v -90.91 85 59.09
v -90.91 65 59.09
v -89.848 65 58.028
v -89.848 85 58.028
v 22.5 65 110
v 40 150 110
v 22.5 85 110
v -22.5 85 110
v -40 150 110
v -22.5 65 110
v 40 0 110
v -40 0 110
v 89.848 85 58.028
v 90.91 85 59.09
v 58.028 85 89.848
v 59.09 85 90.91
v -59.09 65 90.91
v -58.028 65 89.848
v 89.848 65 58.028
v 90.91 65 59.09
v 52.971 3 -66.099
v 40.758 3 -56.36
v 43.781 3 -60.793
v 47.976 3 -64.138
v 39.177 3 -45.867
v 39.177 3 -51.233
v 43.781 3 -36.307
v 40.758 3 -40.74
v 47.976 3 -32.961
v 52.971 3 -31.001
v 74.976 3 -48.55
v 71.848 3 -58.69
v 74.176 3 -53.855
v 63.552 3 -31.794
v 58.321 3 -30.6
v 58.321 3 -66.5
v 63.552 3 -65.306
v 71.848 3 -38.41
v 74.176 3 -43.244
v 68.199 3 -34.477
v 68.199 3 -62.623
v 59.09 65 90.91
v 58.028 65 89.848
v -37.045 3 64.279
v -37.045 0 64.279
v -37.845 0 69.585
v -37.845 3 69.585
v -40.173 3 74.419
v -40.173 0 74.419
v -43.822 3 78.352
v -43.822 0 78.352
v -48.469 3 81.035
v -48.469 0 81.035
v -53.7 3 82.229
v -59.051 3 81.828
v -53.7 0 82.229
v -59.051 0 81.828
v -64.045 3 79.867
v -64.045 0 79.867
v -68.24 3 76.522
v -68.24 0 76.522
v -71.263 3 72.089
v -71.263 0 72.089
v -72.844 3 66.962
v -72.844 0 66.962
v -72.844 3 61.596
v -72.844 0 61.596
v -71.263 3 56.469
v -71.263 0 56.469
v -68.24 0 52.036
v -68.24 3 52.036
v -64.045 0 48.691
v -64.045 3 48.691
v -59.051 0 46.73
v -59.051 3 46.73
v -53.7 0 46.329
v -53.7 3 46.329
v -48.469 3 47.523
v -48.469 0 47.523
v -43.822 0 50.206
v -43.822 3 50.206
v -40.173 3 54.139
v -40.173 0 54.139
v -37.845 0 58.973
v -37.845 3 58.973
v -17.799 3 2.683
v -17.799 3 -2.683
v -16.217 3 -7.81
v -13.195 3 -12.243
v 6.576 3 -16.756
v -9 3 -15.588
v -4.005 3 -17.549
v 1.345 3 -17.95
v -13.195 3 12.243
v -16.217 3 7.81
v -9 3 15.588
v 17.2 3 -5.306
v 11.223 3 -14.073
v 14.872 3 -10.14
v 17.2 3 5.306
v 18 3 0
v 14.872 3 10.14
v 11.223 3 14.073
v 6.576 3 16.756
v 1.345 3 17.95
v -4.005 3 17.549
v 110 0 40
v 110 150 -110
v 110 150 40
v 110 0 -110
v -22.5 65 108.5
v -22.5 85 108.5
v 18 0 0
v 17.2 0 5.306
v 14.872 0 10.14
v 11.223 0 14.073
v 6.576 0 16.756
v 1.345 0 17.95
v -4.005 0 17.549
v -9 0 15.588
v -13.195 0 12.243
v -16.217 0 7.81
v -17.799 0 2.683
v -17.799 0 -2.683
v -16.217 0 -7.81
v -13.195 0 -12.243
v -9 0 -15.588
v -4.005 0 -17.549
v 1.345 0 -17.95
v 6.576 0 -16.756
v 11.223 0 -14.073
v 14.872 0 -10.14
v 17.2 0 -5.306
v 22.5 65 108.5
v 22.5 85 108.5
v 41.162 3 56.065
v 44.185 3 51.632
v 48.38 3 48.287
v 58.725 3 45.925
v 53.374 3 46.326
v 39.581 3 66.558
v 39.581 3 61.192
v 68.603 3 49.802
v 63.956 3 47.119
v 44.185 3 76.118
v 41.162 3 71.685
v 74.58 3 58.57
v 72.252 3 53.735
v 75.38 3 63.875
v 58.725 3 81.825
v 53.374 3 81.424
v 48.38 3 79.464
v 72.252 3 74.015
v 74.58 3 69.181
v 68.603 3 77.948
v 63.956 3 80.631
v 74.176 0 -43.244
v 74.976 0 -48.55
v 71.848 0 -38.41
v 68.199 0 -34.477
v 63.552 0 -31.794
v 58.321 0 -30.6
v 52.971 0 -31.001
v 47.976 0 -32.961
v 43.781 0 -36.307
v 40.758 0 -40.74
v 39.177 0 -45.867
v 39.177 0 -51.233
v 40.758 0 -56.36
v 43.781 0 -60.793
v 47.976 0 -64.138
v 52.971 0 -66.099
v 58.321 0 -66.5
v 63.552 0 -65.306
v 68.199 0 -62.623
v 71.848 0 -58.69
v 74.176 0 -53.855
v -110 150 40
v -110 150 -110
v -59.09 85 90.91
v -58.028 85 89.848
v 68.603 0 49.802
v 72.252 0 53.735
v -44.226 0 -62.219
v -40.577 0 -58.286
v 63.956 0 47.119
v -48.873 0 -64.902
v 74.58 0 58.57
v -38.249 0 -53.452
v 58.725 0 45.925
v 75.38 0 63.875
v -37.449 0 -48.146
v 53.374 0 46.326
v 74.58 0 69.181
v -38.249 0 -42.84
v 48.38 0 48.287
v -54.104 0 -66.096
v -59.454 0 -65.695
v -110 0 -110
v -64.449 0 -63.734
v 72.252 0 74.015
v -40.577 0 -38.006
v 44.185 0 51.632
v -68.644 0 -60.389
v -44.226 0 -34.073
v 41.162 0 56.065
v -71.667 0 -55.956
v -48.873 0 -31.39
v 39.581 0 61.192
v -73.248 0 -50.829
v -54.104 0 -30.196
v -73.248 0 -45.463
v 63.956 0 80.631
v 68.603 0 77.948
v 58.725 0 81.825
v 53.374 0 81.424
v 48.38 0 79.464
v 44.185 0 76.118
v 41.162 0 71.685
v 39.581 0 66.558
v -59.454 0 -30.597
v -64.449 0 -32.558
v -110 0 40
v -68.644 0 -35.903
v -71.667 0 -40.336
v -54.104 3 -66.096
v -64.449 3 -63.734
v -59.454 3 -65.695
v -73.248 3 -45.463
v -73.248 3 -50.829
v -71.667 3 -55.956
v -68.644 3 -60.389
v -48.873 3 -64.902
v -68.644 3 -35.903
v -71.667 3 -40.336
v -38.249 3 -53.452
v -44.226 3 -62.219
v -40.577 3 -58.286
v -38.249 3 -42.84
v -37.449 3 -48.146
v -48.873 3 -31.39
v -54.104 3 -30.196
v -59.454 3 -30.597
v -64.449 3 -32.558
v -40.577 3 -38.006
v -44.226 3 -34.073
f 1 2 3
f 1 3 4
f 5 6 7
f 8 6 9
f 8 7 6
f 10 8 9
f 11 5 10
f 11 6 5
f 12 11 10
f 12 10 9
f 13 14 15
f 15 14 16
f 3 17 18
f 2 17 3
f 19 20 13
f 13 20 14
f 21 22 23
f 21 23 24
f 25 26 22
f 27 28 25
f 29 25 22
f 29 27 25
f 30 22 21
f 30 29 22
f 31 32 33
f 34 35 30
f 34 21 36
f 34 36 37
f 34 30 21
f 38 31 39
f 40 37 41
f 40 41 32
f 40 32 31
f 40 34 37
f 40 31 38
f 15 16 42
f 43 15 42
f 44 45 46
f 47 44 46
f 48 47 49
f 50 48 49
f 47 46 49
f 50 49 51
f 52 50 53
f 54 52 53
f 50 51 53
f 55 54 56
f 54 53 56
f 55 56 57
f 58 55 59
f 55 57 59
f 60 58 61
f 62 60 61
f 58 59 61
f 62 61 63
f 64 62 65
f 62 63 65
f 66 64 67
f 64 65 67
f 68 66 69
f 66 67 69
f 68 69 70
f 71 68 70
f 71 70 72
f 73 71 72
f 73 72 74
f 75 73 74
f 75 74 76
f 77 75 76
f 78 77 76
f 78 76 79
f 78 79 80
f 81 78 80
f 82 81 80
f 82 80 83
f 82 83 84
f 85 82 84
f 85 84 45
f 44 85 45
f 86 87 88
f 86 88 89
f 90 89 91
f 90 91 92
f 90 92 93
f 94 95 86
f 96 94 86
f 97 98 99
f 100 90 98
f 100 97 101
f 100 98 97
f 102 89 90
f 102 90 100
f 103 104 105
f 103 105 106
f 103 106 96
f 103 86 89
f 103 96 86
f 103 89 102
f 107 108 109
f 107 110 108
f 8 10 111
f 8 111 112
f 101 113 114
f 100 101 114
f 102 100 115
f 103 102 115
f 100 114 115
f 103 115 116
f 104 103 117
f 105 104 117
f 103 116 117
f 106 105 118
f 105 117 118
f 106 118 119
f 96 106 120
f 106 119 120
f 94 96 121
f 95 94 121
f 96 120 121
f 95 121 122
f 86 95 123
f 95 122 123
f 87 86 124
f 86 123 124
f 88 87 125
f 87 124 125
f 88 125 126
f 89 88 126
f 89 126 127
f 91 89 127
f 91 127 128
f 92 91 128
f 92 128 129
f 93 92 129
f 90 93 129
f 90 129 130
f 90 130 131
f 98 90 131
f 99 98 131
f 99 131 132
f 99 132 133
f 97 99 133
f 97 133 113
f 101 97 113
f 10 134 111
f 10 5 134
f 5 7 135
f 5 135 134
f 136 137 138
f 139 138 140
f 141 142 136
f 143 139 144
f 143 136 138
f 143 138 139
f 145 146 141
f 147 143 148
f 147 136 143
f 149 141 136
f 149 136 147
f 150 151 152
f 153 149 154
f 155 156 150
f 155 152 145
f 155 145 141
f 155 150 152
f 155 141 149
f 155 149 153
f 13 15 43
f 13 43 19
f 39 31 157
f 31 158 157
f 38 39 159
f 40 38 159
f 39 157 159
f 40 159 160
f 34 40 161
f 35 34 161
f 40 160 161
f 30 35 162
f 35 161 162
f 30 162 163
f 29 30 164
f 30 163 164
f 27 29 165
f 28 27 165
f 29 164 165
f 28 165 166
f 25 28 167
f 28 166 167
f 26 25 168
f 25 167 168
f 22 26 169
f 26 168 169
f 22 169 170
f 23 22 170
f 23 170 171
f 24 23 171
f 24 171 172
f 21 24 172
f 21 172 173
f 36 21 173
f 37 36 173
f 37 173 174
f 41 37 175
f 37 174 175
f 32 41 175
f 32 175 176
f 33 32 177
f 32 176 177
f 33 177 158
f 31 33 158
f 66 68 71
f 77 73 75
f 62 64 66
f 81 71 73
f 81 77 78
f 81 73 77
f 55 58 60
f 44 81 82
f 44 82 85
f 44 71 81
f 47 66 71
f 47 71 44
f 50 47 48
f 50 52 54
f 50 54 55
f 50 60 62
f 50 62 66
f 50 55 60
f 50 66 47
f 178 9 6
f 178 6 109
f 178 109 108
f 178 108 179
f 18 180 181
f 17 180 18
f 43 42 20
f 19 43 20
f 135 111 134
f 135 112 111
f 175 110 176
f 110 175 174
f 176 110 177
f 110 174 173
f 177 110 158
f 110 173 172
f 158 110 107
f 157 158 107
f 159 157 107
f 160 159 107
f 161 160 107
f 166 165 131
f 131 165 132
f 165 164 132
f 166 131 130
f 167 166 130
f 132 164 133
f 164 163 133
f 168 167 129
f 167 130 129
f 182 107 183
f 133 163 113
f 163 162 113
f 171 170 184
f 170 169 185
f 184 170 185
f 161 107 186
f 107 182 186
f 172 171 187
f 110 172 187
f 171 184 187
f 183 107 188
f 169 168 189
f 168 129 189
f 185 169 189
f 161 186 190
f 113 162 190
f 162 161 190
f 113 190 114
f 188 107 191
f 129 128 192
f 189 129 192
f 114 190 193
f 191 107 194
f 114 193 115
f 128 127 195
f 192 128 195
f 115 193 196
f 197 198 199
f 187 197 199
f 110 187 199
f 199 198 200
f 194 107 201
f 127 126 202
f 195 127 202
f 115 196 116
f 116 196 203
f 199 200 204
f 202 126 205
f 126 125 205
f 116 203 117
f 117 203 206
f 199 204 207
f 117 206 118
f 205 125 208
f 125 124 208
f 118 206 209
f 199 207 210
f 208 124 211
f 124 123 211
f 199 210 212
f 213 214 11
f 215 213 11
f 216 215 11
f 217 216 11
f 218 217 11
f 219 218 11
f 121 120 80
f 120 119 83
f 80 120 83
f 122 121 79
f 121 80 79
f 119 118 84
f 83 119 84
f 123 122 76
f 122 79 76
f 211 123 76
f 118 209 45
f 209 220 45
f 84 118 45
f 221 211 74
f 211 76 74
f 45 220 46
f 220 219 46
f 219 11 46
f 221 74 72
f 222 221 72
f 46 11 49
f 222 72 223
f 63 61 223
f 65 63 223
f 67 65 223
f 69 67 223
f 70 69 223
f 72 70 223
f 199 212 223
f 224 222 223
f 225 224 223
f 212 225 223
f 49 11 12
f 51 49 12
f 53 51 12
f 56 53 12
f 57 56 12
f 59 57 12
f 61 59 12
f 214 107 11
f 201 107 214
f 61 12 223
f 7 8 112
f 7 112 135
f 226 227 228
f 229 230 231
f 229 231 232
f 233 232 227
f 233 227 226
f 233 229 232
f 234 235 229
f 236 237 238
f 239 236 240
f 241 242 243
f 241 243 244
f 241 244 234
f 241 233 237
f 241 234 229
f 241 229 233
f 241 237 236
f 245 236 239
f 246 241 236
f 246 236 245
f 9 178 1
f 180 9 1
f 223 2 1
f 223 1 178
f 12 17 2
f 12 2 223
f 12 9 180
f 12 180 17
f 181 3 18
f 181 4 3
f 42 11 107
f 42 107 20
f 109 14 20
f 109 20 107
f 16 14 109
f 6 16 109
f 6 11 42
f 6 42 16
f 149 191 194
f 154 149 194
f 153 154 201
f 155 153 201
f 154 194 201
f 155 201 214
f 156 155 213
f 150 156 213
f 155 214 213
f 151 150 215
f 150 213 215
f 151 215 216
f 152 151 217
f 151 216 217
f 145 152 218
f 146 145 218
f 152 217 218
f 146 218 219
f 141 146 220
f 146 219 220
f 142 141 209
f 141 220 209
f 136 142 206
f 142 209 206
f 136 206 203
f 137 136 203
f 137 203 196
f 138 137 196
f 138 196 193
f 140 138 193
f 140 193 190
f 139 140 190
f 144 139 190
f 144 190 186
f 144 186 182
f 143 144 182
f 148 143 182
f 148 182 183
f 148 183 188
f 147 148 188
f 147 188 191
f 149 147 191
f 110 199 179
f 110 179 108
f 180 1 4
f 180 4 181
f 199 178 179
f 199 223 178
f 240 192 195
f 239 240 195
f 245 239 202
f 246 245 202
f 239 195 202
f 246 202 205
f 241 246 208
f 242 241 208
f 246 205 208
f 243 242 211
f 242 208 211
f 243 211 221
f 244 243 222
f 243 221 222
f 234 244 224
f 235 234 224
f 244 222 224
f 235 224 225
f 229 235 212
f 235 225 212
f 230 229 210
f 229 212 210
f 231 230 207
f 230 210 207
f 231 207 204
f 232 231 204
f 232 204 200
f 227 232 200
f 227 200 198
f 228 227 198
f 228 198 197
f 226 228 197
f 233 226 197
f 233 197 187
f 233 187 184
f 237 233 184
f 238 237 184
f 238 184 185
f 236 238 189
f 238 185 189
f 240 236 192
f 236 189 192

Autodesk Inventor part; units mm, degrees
ref_plane "YZ Plane" through (0, 0, 0) normal (1, 0, 0) x (0, 1, 0)
ref_plane "XZ Plane" through (0, 0, 0) normal (0, 1, 0) x (-1, 0, 0)
ref_plane "XY Plane" through (0, 0, 0) normal (0, 0, 1) x (1, 0, 0)
sketch "Sketch1" plane through (0, 0, 0) normal (0, 1, 0) x (-1, 0, 0)
  line L0 (110, -110) -> (-110, -110)
  line L1 (-110, -110) -> (-110, 110)
  line L2 (-110, 110) -> (110, 110)
  line L3 (110, 110) -> (110, -110)
  dimension "d2" = 220
  dimension "d3" = 220
extrude "Extrusion1" add sketch "Sketch1" along normal blind 150
sketch "Sketch2" plane through (-110, 0, 110) normal (0, 0, 1) x (1, 0, 0)
  line L0 (220, 150) -> (0, 150) projected
  line L1 (0, 0) -> (220, 0) projected
  line L2 (0, 0) -> (0, 150) projected
  line L3 (87.5, 85) -> (132.5, 85)
  line L4 (132.5, 85) -> (132.5, 65)
  line L5 (132.5, 65) -> (87.5, 65)
  line L6 (87.5, 65) -> (87.5, 85)
  line L7 (87.5, 85) -> (132.5, 65) construction
  line L8 (132.5, 85) -> (87.5, 65) construction
  point P0 (110, 0)
  point P1 (110, 75)
  dimension "d6" = 45
  dimension "d7" = 20
extrude "Extrusion2" cut sketch "Sketch2" against normal blind 1.5
chamfer "Chamfer1" distance 70 angle 45 2 edges at (110, 75, 110) (-110, 75, 110)
sketch "Sketch3" plane through (40, 0, 110) normal (0.7071, 0, 0.7071) x (0.7071, 0, -0.7071)
  line L0 (26.9975, 65) -> (71.9975, 65)
  line L1 (71.9975, 65) -> (71.9975, 85)
  line L2 (71.9975, 85) -> (26.9975, 85)
  line L3 (26.9975, 85) -> (26.9975, 65)
  line L4 (26.9975, 65) -> (71.9975, 85) construction
  line L5 (71.9975, 65) -> (26.9975, 85) construction
  point P0 (49.4975, 75)
  dimension "d13" = 45
  dimension "d14" = 20
extrude "Extrusion3" cut sketch "Sketch3" against normal blind 1.5
sketch "Sketch4" plane through (-110, 0, 40) normal (-0.7071, 0, 0.7071) x (0.7071, 0, 0.7071)
  line L0 (26.9975, 85) -> (71.9975, 85)
  line L1 (71.9975, 85) -> (71.9975, 65)
  line L2 (71.9975, 65) -> (26.9975, 65)
  line L3 (26.9975, 65) -> (26.9975, 85)
  line L4 (26.9975, 85) -> (71.9975, 65) construction
  line L5 (71.9975, 85) -> (26.9975, 65) construction
  point P0 (49.4975, 75)
  dimension "d17" = 45
  dimension "d18" = 20
extrude "Extrusion4" cut sketch "Sketch4" against normal blind 1.5
sketch "Sketch5" plane through (0, 0, 0) normal (0, -1, 0) x (1, 0, 0)
  circle A0 centre (-55.0452, 64.279) radius 18
  circle A1 centre (0, 0) radius 18
  circle A2 centre (0, 0) radius 18
  circle A3 centre (57.3798, 63.8751) radius 18
  circle A4 centre (-55.4491, -48.146) radius 18
  circle A5 centre (56.9759, -48.5499) radius 18
extrude "Extrusion7" cut sketch "Sketch5" against normal blind 3
properties part number "bodyy"
